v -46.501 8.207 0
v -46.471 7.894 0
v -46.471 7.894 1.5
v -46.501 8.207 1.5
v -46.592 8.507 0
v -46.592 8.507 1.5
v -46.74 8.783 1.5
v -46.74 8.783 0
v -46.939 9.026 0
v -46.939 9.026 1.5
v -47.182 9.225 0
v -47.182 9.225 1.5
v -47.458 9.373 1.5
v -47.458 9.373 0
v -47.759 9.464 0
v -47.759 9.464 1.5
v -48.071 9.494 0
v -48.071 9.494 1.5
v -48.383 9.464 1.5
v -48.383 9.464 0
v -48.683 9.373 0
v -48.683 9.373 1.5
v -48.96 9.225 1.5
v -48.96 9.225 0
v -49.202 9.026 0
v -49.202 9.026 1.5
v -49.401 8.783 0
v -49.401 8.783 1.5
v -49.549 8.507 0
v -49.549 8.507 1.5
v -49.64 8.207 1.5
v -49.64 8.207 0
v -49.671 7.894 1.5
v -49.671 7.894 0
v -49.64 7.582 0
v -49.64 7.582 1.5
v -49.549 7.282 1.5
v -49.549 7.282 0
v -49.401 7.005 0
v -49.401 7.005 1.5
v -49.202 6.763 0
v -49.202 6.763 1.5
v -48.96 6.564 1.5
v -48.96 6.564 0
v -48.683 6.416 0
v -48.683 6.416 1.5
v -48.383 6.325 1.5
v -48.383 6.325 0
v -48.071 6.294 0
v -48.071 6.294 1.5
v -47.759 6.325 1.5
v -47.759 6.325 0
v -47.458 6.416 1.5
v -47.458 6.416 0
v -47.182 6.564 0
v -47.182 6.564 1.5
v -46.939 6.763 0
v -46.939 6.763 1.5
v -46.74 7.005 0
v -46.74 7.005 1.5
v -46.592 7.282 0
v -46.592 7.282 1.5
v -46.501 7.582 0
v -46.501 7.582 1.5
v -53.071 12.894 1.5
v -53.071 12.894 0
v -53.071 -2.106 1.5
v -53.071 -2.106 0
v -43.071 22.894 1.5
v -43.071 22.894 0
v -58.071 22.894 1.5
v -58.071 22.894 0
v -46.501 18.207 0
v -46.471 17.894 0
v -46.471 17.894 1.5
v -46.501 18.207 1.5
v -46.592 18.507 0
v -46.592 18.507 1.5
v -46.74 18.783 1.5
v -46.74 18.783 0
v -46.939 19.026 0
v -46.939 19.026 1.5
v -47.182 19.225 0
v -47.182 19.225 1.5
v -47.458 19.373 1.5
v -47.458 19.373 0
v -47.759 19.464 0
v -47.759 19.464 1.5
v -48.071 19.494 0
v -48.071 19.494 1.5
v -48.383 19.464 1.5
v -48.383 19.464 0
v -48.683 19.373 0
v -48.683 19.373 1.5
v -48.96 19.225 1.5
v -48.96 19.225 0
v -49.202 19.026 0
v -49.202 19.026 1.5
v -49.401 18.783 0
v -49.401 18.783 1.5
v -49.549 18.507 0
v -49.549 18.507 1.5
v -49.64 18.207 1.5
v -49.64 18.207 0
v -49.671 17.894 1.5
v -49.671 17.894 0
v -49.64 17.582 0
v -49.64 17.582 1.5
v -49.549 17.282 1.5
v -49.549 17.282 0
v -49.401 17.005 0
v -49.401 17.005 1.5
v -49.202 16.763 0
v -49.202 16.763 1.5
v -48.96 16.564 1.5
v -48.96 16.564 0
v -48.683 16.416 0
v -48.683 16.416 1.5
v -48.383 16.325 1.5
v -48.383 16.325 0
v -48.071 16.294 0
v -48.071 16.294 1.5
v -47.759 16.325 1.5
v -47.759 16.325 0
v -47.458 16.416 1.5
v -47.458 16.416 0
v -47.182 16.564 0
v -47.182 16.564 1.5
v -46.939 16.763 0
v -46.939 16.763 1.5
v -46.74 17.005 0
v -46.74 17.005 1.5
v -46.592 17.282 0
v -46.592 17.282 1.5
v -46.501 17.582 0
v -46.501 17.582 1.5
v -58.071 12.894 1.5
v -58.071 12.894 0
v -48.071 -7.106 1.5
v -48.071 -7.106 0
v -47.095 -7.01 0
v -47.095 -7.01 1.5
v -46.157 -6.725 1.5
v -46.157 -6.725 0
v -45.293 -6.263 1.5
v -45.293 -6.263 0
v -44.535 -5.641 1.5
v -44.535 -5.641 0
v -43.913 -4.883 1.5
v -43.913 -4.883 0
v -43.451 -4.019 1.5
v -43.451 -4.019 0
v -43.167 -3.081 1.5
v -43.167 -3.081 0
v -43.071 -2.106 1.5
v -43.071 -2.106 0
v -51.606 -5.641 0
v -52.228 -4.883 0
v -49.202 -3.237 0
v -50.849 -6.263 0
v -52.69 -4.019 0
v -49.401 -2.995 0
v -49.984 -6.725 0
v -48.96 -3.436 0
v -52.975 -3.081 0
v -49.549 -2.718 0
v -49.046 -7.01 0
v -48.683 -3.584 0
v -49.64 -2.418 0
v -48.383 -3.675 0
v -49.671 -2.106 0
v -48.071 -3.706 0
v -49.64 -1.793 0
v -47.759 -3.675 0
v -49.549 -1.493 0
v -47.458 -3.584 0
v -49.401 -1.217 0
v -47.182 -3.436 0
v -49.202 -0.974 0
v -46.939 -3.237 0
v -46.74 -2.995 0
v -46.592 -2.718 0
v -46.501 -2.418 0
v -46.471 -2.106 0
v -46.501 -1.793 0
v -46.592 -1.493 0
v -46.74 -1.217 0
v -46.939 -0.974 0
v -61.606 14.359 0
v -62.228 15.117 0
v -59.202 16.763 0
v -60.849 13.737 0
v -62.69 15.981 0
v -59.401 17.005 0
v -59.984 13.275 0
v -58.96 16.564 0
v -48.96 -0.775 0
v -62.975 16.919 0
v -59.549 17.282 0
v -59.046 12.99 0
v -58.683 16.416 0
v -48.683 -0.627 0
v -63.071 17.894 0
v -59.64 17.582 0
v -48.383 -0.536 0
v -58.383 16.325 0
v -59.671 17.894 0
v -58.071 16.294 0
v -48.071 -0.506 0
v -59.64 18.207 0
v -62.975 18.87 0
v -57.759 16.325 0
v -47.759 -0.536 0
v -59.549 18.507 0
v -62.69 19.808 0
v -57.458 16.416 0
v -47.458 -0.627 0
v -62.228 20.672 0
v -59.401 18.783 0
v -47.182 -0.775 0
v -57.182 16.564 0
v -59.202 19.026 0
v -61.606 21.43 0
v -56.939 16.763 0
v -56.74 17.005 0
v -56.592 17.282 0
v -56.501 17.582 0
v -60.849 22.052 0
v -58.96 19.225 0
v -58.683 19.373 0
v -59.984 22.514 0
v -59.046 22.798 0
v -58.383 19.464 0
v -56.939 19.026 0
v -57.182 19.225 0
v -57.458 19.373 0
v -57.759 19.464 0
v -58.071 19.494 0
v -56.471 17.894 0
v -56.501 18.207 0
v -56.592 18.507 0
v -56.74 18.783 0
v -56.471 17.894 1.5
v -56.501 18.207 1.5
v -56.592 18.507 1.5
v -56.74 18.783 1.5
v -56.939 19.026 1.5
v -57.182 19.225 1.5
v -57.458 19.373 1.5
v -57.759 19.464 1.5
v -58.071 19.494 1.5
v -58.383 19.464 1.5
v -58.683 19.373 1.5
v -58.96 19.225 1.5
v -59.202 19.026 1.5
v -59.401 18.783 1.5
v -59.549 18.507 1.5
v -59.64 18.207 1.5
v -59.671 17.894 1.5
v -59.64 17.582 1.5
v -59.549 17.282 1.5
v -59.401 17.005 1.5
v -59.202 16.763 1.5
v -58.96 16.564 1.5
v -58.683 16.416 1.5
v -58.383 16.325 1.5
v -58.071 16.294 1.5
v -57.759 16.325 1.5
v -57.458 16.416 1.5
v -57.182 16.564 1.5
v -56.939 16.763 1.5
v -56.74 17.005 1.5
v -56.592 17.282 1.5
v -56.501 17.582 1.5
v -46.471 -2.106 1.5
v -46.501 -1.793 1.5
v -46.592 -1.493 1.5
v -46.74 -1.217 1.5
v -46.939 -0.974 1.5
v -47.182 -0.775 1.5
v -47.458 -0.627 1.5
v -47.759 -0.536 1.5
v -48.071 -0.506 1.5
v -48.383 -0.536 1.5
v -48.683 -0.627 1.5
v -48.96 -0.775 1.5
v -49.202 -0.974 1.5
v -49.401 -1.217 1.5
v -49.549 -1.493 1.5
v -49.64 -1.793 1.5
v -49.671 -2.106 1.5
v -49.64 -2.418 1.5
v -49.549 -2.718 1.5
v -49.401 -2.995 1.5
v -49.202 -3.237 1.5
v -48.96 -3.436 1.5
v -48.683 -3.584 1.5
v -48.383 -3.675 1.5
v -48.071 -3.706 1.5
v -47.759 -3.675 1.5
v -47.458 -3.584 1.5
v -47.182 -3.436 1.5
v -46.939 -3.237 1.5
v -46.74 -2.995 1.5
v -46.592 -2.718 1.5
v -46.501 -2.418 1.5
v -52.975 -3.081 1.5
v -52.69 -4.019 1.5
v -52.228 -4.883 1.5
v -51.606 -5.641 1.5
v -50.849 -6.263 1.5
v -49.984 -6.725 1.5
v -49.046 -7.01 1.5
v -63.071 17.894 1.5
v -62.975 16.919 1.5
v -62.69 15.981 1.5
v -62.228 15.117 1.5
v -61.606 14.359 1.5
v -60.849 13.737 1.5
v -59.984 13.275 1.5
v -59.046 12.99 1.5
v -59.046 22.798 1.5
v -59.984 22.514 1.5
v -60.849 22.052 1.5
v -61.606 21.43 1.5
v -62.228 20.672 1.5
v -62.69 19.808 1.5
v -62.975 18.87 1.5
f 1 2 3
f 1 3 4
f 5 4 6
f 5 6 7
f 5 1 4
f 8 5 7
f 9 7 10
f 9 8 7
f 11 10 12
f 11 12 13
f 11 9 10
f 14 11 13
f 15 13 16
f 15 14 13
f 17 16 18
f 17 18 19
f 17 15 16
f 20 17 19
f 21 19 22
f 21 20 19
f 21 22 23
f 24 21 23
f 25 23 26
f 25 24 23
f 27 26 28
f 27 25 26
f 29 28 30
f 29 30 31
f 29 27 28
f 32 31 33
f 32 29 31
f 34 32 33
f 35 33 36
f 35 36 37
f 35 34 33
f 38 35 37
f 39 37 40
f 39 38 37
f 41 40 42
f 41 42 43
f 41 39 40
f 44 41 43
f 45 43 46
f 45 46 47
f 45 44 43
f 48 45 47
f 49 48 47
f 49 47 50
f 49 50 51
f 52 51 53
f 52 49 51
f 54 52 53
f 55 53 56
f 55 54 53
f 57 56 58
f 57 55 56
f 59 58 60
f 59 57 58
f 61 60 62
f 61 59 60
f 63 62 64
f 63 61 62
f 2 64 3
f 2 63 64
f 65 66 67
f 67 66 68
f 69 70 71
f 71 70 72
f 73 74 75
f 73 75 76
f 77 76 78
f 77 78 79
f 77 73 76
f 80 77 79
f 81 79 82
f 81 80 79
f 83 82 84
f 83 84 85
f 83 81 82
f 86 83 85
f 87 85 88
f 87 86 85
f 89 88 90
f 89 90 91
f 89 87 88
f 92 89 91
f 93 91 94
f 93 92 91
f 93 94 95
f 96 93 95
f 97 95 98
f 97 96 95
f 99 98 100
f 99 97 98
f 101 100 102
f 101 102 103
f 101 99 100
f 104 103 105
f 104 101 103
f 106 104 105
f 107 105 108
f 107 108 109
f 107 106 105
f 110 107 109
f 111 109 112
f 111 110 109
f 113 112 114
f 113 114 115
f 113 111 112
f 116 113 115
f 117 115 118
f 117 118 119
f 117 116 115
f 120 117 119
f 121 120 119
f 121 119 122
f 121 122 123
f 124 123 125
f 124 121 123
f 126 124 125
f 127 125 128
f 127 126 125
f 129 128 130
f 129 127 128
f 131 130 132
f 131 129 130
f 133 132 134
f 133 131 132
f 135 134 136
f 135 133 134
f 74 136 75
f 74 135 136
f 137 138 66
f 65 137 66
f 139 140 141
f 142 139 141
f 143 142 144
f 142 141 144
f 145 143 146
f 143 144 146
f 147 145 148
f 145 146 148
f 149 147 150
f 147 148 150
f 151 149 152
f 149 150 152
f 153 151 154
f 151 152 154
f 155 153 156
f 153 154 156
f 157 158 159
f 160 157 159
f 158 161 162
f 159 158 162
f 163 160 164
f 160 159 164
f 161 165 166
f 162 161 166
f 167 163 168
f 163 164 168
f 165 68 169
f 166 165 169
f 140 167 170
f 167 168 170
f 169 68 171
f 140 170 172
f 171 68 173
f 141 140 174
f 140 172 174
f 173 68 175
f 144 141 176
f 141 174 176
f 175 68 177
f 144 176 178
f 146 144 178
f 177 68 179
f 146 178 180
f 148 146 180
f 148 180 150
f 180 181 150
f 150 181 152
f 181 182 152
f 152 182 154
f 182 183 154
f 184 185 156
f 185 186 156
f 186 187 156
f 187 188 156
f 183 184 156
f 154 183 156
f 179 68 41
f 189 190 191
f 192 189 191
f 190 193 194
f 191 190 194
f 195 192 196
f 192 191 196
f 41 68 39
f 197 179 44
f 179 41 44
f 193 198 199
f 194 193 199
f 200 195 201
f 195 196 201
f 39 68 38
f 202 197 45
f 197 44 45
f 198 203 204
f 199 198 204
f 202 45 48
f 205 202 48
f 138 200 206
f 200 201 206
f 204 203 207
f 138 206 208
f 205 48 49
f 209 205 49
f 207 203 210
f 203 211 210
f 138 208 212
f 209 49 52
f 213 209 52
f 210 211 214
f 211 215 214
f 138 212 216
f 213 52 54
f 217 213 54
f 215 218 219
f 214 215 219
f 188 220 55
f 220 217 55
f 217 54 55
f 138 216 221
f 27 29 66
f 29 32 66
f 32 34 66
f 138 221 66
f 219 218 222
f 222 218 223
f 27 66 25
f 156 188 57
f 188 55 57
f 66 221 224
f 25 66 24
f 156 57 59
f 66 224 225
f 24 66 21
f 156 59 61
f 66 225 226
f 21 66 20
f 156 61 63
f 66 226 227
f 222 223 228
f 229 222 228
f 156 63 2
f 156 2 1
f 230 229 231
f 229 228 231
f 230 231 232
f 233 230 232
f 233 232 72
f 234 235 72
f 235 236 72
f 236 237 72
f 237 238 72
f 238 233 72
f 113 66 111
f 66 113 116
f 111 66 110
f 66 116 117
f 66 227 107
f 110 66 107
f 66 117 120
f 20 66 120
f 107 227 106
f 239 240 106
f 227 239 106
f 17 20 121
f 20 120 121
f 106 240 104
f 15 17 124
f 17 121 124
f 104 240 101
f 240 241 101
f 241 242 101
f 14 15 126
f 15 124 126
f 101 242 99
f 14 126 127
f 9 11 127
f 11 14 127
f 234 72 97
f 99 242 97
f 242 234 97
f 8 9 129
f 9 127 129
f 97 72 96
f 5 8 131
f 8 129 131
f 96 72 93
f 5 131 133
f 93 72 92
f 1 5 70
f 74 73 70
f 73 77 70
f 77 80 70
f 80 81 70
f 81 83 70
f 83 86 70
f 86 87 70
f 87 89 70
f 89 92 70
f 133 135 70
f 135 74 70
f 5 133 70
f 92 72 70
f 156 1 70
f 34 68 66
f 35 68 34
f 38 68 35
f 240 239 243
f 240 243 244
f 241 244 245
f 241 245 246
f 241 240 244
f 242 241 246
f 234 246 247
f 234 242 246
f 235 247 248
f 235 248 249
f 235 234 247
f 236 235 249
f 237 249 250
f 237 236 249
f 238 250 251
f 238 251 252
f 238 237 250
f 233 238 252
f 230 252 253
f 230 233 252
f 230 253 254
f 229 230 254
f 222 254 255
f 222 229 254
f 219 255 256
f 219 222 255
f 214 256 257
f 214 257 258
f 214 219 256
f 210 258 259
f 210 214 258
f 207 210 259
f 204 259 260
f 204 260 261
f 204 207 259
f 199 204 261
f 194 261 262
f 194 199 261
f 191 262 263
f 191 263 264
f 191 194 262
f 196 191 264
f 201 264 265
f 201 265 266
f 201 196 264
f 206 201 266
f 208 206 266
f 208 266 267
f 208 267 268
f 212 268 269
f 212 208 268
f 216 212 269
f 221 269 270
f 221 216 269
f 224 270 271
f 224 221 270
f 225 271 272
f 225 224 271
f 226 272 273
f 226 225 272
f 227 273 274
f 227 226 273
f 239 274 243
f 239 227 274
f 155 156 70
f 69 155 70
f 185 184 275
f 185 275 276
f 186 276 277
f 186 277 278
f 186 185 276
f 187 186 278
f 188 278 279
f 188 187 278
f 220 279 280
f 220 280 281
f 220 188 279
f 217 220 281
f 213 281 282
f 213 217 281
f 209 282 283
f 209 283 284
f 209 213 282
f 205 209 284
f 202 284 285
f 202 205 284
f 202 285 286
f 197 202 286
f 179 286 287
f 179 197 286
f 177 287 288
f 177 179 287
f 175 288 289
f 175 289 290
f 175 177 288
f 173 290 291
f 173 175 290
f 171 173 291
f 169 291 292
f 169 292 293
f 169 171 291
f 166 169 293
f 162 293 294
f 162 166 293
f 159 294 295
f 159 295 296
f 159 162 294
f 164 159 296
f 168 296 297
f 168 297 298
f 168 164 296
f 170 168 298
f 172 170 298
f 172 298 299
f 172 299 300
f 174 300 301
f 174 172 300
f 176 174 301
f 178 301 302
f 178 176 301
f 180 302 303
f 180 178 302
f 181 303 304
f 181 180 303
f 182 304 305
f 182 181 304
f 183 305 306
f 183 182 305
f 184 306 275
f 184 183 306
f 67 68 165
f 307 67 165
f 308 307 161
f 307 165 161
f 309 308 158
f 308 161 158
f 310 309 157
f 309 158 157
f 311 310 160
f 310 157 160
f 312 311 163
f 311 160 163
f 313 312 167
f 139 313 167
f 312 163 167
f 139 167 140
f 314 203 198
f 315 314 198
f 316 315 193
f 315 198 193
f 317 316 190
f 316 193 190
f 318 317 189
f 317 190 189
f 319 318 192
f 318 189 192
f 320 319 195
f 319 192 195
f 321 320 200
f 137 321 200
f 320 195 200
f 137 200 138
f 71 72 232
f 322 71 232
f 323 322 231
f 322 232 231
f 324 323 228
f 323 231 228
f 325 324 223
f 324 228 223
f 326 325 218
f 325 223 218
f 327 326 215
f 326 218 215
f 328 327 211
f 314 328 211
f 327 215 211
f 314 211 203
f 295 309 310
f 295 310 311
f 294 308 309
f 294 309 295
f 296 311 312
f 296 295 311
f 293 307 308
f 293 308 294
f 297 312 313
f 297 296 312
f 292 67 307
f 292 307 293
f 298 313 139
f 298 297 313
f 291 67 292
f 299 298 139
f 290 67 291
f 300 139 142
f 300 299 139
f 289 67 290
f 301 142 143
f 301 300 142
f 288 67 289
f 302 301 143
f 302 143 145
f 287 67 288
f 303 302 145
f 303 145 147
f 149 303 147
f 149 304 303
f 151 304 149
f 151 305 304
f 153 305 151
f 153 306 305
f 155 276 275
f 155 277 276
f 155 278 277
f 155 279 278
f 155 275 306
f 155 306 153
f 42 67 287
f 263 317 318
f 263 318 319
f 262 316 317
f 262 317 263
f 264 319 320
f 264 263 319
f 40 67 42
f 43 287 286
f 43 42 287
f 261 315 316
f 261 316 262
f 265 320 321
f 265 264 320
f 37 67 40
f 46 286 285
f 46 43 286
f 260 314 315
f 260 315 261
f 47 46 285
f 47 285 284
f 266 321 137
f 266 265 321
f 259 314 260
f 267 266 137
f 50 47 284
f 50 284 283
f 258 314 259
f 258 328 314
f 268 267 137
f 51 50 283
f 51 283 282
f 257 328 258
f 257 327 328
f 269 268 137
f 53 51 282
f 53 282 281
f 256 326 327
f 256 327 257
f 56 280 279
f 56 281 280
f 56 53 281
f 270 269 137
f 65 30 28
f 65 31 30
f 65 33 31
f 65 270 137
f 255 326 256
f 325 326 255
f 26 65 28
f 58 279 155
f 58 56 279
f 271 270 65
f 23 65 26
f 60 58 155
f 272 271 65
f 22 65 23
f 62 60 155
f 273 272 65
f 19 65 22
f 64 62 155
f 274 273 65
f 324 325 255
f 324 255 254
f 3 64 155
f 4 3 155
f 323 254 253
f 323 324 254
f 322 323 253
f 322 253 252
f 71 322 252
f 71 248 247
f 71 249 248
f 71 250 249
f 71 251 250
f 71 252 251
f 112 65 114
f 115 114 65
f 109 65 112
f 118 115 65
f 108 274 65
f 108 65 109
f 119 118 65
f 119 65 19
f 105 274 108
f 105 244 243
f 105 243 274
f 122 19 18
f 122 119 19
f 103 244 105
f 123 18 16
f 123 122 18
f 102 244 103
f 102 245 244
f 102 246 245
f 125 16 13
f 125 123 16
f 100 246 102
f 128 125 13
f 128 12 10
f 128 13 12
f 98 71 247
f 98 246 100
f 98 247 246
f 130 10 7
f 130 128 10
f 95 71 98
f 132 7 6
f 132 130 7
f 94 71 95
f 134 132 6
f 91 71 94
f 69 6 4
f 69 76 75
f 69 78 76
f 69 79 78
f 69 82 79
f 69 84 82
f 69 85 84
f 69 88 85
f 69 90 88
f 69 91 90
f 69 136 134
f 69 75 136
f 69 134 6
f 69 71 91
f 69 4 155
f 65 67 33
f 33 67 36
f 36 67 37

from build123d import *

# Parameters (mm, degrees)
F0_R     = 1.6
F1_DEPTH = 1.5


with BuildPart() as f1:
    # F0 (on Top) → F1 (new body)
    with BuildSketch(Plane.XY):
        with BuildLine():
            Line((-43.070649, 22.894378), (-58.070649, 22.894378))
            ThreePointArc((-58.070649, 22.894378), (-61.606183, 21.429912), (-63.070649, 17.894378))
            ThreePointArc((-63.070649, 17.894378), (-61.606183, 14.358844), (-58.070649, 12.894378))
            Line((-58.070649, 12.894378), (-53.070649, 12.894378))
            Line((-53.070649, 12.894378), (-43.070649, 12.894378))
            Line((-43.070649, 12.894378), (-43.070649, 22.894378))
        make_face()
        with Locations((-58.070649, 17.894378)):
            Circle(F0_R, mode=Mode.SUBTRACT)
        with Locations((-48.070649, 17.894378)):
            Circle(F0_R, mode=Mode.SUBTRACT)
        with BuildLine():
            Line((-43.070649, -2.105622), (-43.070649, 12.894378))
            Line((-43.070649, 12.894378), (-53.070649, 12.894378))
            Line((-53.070649, 12.894378), (-53.070649, -2.105622))
            ThreePointArc((-53.070649, -2.105622), (-51.606183, -5.641156), (-48.070649, -7.105622))
            ThreePointArc((-48.070649, -7.105622), (-44.535115, -5.641156), (-43.070649, -2.105622))
        make_face()
        with Locations((-48.070649, -2.105622)):
            Circle(F0_R, mode=Mode.SUBTRACT)
        with Locations((-48.070649, 7.894378)):
            Circle(F0_R, mode=Mode.SUBTRACT)
    extrude(amount=F1_DEPTH)


solid = f1.part
